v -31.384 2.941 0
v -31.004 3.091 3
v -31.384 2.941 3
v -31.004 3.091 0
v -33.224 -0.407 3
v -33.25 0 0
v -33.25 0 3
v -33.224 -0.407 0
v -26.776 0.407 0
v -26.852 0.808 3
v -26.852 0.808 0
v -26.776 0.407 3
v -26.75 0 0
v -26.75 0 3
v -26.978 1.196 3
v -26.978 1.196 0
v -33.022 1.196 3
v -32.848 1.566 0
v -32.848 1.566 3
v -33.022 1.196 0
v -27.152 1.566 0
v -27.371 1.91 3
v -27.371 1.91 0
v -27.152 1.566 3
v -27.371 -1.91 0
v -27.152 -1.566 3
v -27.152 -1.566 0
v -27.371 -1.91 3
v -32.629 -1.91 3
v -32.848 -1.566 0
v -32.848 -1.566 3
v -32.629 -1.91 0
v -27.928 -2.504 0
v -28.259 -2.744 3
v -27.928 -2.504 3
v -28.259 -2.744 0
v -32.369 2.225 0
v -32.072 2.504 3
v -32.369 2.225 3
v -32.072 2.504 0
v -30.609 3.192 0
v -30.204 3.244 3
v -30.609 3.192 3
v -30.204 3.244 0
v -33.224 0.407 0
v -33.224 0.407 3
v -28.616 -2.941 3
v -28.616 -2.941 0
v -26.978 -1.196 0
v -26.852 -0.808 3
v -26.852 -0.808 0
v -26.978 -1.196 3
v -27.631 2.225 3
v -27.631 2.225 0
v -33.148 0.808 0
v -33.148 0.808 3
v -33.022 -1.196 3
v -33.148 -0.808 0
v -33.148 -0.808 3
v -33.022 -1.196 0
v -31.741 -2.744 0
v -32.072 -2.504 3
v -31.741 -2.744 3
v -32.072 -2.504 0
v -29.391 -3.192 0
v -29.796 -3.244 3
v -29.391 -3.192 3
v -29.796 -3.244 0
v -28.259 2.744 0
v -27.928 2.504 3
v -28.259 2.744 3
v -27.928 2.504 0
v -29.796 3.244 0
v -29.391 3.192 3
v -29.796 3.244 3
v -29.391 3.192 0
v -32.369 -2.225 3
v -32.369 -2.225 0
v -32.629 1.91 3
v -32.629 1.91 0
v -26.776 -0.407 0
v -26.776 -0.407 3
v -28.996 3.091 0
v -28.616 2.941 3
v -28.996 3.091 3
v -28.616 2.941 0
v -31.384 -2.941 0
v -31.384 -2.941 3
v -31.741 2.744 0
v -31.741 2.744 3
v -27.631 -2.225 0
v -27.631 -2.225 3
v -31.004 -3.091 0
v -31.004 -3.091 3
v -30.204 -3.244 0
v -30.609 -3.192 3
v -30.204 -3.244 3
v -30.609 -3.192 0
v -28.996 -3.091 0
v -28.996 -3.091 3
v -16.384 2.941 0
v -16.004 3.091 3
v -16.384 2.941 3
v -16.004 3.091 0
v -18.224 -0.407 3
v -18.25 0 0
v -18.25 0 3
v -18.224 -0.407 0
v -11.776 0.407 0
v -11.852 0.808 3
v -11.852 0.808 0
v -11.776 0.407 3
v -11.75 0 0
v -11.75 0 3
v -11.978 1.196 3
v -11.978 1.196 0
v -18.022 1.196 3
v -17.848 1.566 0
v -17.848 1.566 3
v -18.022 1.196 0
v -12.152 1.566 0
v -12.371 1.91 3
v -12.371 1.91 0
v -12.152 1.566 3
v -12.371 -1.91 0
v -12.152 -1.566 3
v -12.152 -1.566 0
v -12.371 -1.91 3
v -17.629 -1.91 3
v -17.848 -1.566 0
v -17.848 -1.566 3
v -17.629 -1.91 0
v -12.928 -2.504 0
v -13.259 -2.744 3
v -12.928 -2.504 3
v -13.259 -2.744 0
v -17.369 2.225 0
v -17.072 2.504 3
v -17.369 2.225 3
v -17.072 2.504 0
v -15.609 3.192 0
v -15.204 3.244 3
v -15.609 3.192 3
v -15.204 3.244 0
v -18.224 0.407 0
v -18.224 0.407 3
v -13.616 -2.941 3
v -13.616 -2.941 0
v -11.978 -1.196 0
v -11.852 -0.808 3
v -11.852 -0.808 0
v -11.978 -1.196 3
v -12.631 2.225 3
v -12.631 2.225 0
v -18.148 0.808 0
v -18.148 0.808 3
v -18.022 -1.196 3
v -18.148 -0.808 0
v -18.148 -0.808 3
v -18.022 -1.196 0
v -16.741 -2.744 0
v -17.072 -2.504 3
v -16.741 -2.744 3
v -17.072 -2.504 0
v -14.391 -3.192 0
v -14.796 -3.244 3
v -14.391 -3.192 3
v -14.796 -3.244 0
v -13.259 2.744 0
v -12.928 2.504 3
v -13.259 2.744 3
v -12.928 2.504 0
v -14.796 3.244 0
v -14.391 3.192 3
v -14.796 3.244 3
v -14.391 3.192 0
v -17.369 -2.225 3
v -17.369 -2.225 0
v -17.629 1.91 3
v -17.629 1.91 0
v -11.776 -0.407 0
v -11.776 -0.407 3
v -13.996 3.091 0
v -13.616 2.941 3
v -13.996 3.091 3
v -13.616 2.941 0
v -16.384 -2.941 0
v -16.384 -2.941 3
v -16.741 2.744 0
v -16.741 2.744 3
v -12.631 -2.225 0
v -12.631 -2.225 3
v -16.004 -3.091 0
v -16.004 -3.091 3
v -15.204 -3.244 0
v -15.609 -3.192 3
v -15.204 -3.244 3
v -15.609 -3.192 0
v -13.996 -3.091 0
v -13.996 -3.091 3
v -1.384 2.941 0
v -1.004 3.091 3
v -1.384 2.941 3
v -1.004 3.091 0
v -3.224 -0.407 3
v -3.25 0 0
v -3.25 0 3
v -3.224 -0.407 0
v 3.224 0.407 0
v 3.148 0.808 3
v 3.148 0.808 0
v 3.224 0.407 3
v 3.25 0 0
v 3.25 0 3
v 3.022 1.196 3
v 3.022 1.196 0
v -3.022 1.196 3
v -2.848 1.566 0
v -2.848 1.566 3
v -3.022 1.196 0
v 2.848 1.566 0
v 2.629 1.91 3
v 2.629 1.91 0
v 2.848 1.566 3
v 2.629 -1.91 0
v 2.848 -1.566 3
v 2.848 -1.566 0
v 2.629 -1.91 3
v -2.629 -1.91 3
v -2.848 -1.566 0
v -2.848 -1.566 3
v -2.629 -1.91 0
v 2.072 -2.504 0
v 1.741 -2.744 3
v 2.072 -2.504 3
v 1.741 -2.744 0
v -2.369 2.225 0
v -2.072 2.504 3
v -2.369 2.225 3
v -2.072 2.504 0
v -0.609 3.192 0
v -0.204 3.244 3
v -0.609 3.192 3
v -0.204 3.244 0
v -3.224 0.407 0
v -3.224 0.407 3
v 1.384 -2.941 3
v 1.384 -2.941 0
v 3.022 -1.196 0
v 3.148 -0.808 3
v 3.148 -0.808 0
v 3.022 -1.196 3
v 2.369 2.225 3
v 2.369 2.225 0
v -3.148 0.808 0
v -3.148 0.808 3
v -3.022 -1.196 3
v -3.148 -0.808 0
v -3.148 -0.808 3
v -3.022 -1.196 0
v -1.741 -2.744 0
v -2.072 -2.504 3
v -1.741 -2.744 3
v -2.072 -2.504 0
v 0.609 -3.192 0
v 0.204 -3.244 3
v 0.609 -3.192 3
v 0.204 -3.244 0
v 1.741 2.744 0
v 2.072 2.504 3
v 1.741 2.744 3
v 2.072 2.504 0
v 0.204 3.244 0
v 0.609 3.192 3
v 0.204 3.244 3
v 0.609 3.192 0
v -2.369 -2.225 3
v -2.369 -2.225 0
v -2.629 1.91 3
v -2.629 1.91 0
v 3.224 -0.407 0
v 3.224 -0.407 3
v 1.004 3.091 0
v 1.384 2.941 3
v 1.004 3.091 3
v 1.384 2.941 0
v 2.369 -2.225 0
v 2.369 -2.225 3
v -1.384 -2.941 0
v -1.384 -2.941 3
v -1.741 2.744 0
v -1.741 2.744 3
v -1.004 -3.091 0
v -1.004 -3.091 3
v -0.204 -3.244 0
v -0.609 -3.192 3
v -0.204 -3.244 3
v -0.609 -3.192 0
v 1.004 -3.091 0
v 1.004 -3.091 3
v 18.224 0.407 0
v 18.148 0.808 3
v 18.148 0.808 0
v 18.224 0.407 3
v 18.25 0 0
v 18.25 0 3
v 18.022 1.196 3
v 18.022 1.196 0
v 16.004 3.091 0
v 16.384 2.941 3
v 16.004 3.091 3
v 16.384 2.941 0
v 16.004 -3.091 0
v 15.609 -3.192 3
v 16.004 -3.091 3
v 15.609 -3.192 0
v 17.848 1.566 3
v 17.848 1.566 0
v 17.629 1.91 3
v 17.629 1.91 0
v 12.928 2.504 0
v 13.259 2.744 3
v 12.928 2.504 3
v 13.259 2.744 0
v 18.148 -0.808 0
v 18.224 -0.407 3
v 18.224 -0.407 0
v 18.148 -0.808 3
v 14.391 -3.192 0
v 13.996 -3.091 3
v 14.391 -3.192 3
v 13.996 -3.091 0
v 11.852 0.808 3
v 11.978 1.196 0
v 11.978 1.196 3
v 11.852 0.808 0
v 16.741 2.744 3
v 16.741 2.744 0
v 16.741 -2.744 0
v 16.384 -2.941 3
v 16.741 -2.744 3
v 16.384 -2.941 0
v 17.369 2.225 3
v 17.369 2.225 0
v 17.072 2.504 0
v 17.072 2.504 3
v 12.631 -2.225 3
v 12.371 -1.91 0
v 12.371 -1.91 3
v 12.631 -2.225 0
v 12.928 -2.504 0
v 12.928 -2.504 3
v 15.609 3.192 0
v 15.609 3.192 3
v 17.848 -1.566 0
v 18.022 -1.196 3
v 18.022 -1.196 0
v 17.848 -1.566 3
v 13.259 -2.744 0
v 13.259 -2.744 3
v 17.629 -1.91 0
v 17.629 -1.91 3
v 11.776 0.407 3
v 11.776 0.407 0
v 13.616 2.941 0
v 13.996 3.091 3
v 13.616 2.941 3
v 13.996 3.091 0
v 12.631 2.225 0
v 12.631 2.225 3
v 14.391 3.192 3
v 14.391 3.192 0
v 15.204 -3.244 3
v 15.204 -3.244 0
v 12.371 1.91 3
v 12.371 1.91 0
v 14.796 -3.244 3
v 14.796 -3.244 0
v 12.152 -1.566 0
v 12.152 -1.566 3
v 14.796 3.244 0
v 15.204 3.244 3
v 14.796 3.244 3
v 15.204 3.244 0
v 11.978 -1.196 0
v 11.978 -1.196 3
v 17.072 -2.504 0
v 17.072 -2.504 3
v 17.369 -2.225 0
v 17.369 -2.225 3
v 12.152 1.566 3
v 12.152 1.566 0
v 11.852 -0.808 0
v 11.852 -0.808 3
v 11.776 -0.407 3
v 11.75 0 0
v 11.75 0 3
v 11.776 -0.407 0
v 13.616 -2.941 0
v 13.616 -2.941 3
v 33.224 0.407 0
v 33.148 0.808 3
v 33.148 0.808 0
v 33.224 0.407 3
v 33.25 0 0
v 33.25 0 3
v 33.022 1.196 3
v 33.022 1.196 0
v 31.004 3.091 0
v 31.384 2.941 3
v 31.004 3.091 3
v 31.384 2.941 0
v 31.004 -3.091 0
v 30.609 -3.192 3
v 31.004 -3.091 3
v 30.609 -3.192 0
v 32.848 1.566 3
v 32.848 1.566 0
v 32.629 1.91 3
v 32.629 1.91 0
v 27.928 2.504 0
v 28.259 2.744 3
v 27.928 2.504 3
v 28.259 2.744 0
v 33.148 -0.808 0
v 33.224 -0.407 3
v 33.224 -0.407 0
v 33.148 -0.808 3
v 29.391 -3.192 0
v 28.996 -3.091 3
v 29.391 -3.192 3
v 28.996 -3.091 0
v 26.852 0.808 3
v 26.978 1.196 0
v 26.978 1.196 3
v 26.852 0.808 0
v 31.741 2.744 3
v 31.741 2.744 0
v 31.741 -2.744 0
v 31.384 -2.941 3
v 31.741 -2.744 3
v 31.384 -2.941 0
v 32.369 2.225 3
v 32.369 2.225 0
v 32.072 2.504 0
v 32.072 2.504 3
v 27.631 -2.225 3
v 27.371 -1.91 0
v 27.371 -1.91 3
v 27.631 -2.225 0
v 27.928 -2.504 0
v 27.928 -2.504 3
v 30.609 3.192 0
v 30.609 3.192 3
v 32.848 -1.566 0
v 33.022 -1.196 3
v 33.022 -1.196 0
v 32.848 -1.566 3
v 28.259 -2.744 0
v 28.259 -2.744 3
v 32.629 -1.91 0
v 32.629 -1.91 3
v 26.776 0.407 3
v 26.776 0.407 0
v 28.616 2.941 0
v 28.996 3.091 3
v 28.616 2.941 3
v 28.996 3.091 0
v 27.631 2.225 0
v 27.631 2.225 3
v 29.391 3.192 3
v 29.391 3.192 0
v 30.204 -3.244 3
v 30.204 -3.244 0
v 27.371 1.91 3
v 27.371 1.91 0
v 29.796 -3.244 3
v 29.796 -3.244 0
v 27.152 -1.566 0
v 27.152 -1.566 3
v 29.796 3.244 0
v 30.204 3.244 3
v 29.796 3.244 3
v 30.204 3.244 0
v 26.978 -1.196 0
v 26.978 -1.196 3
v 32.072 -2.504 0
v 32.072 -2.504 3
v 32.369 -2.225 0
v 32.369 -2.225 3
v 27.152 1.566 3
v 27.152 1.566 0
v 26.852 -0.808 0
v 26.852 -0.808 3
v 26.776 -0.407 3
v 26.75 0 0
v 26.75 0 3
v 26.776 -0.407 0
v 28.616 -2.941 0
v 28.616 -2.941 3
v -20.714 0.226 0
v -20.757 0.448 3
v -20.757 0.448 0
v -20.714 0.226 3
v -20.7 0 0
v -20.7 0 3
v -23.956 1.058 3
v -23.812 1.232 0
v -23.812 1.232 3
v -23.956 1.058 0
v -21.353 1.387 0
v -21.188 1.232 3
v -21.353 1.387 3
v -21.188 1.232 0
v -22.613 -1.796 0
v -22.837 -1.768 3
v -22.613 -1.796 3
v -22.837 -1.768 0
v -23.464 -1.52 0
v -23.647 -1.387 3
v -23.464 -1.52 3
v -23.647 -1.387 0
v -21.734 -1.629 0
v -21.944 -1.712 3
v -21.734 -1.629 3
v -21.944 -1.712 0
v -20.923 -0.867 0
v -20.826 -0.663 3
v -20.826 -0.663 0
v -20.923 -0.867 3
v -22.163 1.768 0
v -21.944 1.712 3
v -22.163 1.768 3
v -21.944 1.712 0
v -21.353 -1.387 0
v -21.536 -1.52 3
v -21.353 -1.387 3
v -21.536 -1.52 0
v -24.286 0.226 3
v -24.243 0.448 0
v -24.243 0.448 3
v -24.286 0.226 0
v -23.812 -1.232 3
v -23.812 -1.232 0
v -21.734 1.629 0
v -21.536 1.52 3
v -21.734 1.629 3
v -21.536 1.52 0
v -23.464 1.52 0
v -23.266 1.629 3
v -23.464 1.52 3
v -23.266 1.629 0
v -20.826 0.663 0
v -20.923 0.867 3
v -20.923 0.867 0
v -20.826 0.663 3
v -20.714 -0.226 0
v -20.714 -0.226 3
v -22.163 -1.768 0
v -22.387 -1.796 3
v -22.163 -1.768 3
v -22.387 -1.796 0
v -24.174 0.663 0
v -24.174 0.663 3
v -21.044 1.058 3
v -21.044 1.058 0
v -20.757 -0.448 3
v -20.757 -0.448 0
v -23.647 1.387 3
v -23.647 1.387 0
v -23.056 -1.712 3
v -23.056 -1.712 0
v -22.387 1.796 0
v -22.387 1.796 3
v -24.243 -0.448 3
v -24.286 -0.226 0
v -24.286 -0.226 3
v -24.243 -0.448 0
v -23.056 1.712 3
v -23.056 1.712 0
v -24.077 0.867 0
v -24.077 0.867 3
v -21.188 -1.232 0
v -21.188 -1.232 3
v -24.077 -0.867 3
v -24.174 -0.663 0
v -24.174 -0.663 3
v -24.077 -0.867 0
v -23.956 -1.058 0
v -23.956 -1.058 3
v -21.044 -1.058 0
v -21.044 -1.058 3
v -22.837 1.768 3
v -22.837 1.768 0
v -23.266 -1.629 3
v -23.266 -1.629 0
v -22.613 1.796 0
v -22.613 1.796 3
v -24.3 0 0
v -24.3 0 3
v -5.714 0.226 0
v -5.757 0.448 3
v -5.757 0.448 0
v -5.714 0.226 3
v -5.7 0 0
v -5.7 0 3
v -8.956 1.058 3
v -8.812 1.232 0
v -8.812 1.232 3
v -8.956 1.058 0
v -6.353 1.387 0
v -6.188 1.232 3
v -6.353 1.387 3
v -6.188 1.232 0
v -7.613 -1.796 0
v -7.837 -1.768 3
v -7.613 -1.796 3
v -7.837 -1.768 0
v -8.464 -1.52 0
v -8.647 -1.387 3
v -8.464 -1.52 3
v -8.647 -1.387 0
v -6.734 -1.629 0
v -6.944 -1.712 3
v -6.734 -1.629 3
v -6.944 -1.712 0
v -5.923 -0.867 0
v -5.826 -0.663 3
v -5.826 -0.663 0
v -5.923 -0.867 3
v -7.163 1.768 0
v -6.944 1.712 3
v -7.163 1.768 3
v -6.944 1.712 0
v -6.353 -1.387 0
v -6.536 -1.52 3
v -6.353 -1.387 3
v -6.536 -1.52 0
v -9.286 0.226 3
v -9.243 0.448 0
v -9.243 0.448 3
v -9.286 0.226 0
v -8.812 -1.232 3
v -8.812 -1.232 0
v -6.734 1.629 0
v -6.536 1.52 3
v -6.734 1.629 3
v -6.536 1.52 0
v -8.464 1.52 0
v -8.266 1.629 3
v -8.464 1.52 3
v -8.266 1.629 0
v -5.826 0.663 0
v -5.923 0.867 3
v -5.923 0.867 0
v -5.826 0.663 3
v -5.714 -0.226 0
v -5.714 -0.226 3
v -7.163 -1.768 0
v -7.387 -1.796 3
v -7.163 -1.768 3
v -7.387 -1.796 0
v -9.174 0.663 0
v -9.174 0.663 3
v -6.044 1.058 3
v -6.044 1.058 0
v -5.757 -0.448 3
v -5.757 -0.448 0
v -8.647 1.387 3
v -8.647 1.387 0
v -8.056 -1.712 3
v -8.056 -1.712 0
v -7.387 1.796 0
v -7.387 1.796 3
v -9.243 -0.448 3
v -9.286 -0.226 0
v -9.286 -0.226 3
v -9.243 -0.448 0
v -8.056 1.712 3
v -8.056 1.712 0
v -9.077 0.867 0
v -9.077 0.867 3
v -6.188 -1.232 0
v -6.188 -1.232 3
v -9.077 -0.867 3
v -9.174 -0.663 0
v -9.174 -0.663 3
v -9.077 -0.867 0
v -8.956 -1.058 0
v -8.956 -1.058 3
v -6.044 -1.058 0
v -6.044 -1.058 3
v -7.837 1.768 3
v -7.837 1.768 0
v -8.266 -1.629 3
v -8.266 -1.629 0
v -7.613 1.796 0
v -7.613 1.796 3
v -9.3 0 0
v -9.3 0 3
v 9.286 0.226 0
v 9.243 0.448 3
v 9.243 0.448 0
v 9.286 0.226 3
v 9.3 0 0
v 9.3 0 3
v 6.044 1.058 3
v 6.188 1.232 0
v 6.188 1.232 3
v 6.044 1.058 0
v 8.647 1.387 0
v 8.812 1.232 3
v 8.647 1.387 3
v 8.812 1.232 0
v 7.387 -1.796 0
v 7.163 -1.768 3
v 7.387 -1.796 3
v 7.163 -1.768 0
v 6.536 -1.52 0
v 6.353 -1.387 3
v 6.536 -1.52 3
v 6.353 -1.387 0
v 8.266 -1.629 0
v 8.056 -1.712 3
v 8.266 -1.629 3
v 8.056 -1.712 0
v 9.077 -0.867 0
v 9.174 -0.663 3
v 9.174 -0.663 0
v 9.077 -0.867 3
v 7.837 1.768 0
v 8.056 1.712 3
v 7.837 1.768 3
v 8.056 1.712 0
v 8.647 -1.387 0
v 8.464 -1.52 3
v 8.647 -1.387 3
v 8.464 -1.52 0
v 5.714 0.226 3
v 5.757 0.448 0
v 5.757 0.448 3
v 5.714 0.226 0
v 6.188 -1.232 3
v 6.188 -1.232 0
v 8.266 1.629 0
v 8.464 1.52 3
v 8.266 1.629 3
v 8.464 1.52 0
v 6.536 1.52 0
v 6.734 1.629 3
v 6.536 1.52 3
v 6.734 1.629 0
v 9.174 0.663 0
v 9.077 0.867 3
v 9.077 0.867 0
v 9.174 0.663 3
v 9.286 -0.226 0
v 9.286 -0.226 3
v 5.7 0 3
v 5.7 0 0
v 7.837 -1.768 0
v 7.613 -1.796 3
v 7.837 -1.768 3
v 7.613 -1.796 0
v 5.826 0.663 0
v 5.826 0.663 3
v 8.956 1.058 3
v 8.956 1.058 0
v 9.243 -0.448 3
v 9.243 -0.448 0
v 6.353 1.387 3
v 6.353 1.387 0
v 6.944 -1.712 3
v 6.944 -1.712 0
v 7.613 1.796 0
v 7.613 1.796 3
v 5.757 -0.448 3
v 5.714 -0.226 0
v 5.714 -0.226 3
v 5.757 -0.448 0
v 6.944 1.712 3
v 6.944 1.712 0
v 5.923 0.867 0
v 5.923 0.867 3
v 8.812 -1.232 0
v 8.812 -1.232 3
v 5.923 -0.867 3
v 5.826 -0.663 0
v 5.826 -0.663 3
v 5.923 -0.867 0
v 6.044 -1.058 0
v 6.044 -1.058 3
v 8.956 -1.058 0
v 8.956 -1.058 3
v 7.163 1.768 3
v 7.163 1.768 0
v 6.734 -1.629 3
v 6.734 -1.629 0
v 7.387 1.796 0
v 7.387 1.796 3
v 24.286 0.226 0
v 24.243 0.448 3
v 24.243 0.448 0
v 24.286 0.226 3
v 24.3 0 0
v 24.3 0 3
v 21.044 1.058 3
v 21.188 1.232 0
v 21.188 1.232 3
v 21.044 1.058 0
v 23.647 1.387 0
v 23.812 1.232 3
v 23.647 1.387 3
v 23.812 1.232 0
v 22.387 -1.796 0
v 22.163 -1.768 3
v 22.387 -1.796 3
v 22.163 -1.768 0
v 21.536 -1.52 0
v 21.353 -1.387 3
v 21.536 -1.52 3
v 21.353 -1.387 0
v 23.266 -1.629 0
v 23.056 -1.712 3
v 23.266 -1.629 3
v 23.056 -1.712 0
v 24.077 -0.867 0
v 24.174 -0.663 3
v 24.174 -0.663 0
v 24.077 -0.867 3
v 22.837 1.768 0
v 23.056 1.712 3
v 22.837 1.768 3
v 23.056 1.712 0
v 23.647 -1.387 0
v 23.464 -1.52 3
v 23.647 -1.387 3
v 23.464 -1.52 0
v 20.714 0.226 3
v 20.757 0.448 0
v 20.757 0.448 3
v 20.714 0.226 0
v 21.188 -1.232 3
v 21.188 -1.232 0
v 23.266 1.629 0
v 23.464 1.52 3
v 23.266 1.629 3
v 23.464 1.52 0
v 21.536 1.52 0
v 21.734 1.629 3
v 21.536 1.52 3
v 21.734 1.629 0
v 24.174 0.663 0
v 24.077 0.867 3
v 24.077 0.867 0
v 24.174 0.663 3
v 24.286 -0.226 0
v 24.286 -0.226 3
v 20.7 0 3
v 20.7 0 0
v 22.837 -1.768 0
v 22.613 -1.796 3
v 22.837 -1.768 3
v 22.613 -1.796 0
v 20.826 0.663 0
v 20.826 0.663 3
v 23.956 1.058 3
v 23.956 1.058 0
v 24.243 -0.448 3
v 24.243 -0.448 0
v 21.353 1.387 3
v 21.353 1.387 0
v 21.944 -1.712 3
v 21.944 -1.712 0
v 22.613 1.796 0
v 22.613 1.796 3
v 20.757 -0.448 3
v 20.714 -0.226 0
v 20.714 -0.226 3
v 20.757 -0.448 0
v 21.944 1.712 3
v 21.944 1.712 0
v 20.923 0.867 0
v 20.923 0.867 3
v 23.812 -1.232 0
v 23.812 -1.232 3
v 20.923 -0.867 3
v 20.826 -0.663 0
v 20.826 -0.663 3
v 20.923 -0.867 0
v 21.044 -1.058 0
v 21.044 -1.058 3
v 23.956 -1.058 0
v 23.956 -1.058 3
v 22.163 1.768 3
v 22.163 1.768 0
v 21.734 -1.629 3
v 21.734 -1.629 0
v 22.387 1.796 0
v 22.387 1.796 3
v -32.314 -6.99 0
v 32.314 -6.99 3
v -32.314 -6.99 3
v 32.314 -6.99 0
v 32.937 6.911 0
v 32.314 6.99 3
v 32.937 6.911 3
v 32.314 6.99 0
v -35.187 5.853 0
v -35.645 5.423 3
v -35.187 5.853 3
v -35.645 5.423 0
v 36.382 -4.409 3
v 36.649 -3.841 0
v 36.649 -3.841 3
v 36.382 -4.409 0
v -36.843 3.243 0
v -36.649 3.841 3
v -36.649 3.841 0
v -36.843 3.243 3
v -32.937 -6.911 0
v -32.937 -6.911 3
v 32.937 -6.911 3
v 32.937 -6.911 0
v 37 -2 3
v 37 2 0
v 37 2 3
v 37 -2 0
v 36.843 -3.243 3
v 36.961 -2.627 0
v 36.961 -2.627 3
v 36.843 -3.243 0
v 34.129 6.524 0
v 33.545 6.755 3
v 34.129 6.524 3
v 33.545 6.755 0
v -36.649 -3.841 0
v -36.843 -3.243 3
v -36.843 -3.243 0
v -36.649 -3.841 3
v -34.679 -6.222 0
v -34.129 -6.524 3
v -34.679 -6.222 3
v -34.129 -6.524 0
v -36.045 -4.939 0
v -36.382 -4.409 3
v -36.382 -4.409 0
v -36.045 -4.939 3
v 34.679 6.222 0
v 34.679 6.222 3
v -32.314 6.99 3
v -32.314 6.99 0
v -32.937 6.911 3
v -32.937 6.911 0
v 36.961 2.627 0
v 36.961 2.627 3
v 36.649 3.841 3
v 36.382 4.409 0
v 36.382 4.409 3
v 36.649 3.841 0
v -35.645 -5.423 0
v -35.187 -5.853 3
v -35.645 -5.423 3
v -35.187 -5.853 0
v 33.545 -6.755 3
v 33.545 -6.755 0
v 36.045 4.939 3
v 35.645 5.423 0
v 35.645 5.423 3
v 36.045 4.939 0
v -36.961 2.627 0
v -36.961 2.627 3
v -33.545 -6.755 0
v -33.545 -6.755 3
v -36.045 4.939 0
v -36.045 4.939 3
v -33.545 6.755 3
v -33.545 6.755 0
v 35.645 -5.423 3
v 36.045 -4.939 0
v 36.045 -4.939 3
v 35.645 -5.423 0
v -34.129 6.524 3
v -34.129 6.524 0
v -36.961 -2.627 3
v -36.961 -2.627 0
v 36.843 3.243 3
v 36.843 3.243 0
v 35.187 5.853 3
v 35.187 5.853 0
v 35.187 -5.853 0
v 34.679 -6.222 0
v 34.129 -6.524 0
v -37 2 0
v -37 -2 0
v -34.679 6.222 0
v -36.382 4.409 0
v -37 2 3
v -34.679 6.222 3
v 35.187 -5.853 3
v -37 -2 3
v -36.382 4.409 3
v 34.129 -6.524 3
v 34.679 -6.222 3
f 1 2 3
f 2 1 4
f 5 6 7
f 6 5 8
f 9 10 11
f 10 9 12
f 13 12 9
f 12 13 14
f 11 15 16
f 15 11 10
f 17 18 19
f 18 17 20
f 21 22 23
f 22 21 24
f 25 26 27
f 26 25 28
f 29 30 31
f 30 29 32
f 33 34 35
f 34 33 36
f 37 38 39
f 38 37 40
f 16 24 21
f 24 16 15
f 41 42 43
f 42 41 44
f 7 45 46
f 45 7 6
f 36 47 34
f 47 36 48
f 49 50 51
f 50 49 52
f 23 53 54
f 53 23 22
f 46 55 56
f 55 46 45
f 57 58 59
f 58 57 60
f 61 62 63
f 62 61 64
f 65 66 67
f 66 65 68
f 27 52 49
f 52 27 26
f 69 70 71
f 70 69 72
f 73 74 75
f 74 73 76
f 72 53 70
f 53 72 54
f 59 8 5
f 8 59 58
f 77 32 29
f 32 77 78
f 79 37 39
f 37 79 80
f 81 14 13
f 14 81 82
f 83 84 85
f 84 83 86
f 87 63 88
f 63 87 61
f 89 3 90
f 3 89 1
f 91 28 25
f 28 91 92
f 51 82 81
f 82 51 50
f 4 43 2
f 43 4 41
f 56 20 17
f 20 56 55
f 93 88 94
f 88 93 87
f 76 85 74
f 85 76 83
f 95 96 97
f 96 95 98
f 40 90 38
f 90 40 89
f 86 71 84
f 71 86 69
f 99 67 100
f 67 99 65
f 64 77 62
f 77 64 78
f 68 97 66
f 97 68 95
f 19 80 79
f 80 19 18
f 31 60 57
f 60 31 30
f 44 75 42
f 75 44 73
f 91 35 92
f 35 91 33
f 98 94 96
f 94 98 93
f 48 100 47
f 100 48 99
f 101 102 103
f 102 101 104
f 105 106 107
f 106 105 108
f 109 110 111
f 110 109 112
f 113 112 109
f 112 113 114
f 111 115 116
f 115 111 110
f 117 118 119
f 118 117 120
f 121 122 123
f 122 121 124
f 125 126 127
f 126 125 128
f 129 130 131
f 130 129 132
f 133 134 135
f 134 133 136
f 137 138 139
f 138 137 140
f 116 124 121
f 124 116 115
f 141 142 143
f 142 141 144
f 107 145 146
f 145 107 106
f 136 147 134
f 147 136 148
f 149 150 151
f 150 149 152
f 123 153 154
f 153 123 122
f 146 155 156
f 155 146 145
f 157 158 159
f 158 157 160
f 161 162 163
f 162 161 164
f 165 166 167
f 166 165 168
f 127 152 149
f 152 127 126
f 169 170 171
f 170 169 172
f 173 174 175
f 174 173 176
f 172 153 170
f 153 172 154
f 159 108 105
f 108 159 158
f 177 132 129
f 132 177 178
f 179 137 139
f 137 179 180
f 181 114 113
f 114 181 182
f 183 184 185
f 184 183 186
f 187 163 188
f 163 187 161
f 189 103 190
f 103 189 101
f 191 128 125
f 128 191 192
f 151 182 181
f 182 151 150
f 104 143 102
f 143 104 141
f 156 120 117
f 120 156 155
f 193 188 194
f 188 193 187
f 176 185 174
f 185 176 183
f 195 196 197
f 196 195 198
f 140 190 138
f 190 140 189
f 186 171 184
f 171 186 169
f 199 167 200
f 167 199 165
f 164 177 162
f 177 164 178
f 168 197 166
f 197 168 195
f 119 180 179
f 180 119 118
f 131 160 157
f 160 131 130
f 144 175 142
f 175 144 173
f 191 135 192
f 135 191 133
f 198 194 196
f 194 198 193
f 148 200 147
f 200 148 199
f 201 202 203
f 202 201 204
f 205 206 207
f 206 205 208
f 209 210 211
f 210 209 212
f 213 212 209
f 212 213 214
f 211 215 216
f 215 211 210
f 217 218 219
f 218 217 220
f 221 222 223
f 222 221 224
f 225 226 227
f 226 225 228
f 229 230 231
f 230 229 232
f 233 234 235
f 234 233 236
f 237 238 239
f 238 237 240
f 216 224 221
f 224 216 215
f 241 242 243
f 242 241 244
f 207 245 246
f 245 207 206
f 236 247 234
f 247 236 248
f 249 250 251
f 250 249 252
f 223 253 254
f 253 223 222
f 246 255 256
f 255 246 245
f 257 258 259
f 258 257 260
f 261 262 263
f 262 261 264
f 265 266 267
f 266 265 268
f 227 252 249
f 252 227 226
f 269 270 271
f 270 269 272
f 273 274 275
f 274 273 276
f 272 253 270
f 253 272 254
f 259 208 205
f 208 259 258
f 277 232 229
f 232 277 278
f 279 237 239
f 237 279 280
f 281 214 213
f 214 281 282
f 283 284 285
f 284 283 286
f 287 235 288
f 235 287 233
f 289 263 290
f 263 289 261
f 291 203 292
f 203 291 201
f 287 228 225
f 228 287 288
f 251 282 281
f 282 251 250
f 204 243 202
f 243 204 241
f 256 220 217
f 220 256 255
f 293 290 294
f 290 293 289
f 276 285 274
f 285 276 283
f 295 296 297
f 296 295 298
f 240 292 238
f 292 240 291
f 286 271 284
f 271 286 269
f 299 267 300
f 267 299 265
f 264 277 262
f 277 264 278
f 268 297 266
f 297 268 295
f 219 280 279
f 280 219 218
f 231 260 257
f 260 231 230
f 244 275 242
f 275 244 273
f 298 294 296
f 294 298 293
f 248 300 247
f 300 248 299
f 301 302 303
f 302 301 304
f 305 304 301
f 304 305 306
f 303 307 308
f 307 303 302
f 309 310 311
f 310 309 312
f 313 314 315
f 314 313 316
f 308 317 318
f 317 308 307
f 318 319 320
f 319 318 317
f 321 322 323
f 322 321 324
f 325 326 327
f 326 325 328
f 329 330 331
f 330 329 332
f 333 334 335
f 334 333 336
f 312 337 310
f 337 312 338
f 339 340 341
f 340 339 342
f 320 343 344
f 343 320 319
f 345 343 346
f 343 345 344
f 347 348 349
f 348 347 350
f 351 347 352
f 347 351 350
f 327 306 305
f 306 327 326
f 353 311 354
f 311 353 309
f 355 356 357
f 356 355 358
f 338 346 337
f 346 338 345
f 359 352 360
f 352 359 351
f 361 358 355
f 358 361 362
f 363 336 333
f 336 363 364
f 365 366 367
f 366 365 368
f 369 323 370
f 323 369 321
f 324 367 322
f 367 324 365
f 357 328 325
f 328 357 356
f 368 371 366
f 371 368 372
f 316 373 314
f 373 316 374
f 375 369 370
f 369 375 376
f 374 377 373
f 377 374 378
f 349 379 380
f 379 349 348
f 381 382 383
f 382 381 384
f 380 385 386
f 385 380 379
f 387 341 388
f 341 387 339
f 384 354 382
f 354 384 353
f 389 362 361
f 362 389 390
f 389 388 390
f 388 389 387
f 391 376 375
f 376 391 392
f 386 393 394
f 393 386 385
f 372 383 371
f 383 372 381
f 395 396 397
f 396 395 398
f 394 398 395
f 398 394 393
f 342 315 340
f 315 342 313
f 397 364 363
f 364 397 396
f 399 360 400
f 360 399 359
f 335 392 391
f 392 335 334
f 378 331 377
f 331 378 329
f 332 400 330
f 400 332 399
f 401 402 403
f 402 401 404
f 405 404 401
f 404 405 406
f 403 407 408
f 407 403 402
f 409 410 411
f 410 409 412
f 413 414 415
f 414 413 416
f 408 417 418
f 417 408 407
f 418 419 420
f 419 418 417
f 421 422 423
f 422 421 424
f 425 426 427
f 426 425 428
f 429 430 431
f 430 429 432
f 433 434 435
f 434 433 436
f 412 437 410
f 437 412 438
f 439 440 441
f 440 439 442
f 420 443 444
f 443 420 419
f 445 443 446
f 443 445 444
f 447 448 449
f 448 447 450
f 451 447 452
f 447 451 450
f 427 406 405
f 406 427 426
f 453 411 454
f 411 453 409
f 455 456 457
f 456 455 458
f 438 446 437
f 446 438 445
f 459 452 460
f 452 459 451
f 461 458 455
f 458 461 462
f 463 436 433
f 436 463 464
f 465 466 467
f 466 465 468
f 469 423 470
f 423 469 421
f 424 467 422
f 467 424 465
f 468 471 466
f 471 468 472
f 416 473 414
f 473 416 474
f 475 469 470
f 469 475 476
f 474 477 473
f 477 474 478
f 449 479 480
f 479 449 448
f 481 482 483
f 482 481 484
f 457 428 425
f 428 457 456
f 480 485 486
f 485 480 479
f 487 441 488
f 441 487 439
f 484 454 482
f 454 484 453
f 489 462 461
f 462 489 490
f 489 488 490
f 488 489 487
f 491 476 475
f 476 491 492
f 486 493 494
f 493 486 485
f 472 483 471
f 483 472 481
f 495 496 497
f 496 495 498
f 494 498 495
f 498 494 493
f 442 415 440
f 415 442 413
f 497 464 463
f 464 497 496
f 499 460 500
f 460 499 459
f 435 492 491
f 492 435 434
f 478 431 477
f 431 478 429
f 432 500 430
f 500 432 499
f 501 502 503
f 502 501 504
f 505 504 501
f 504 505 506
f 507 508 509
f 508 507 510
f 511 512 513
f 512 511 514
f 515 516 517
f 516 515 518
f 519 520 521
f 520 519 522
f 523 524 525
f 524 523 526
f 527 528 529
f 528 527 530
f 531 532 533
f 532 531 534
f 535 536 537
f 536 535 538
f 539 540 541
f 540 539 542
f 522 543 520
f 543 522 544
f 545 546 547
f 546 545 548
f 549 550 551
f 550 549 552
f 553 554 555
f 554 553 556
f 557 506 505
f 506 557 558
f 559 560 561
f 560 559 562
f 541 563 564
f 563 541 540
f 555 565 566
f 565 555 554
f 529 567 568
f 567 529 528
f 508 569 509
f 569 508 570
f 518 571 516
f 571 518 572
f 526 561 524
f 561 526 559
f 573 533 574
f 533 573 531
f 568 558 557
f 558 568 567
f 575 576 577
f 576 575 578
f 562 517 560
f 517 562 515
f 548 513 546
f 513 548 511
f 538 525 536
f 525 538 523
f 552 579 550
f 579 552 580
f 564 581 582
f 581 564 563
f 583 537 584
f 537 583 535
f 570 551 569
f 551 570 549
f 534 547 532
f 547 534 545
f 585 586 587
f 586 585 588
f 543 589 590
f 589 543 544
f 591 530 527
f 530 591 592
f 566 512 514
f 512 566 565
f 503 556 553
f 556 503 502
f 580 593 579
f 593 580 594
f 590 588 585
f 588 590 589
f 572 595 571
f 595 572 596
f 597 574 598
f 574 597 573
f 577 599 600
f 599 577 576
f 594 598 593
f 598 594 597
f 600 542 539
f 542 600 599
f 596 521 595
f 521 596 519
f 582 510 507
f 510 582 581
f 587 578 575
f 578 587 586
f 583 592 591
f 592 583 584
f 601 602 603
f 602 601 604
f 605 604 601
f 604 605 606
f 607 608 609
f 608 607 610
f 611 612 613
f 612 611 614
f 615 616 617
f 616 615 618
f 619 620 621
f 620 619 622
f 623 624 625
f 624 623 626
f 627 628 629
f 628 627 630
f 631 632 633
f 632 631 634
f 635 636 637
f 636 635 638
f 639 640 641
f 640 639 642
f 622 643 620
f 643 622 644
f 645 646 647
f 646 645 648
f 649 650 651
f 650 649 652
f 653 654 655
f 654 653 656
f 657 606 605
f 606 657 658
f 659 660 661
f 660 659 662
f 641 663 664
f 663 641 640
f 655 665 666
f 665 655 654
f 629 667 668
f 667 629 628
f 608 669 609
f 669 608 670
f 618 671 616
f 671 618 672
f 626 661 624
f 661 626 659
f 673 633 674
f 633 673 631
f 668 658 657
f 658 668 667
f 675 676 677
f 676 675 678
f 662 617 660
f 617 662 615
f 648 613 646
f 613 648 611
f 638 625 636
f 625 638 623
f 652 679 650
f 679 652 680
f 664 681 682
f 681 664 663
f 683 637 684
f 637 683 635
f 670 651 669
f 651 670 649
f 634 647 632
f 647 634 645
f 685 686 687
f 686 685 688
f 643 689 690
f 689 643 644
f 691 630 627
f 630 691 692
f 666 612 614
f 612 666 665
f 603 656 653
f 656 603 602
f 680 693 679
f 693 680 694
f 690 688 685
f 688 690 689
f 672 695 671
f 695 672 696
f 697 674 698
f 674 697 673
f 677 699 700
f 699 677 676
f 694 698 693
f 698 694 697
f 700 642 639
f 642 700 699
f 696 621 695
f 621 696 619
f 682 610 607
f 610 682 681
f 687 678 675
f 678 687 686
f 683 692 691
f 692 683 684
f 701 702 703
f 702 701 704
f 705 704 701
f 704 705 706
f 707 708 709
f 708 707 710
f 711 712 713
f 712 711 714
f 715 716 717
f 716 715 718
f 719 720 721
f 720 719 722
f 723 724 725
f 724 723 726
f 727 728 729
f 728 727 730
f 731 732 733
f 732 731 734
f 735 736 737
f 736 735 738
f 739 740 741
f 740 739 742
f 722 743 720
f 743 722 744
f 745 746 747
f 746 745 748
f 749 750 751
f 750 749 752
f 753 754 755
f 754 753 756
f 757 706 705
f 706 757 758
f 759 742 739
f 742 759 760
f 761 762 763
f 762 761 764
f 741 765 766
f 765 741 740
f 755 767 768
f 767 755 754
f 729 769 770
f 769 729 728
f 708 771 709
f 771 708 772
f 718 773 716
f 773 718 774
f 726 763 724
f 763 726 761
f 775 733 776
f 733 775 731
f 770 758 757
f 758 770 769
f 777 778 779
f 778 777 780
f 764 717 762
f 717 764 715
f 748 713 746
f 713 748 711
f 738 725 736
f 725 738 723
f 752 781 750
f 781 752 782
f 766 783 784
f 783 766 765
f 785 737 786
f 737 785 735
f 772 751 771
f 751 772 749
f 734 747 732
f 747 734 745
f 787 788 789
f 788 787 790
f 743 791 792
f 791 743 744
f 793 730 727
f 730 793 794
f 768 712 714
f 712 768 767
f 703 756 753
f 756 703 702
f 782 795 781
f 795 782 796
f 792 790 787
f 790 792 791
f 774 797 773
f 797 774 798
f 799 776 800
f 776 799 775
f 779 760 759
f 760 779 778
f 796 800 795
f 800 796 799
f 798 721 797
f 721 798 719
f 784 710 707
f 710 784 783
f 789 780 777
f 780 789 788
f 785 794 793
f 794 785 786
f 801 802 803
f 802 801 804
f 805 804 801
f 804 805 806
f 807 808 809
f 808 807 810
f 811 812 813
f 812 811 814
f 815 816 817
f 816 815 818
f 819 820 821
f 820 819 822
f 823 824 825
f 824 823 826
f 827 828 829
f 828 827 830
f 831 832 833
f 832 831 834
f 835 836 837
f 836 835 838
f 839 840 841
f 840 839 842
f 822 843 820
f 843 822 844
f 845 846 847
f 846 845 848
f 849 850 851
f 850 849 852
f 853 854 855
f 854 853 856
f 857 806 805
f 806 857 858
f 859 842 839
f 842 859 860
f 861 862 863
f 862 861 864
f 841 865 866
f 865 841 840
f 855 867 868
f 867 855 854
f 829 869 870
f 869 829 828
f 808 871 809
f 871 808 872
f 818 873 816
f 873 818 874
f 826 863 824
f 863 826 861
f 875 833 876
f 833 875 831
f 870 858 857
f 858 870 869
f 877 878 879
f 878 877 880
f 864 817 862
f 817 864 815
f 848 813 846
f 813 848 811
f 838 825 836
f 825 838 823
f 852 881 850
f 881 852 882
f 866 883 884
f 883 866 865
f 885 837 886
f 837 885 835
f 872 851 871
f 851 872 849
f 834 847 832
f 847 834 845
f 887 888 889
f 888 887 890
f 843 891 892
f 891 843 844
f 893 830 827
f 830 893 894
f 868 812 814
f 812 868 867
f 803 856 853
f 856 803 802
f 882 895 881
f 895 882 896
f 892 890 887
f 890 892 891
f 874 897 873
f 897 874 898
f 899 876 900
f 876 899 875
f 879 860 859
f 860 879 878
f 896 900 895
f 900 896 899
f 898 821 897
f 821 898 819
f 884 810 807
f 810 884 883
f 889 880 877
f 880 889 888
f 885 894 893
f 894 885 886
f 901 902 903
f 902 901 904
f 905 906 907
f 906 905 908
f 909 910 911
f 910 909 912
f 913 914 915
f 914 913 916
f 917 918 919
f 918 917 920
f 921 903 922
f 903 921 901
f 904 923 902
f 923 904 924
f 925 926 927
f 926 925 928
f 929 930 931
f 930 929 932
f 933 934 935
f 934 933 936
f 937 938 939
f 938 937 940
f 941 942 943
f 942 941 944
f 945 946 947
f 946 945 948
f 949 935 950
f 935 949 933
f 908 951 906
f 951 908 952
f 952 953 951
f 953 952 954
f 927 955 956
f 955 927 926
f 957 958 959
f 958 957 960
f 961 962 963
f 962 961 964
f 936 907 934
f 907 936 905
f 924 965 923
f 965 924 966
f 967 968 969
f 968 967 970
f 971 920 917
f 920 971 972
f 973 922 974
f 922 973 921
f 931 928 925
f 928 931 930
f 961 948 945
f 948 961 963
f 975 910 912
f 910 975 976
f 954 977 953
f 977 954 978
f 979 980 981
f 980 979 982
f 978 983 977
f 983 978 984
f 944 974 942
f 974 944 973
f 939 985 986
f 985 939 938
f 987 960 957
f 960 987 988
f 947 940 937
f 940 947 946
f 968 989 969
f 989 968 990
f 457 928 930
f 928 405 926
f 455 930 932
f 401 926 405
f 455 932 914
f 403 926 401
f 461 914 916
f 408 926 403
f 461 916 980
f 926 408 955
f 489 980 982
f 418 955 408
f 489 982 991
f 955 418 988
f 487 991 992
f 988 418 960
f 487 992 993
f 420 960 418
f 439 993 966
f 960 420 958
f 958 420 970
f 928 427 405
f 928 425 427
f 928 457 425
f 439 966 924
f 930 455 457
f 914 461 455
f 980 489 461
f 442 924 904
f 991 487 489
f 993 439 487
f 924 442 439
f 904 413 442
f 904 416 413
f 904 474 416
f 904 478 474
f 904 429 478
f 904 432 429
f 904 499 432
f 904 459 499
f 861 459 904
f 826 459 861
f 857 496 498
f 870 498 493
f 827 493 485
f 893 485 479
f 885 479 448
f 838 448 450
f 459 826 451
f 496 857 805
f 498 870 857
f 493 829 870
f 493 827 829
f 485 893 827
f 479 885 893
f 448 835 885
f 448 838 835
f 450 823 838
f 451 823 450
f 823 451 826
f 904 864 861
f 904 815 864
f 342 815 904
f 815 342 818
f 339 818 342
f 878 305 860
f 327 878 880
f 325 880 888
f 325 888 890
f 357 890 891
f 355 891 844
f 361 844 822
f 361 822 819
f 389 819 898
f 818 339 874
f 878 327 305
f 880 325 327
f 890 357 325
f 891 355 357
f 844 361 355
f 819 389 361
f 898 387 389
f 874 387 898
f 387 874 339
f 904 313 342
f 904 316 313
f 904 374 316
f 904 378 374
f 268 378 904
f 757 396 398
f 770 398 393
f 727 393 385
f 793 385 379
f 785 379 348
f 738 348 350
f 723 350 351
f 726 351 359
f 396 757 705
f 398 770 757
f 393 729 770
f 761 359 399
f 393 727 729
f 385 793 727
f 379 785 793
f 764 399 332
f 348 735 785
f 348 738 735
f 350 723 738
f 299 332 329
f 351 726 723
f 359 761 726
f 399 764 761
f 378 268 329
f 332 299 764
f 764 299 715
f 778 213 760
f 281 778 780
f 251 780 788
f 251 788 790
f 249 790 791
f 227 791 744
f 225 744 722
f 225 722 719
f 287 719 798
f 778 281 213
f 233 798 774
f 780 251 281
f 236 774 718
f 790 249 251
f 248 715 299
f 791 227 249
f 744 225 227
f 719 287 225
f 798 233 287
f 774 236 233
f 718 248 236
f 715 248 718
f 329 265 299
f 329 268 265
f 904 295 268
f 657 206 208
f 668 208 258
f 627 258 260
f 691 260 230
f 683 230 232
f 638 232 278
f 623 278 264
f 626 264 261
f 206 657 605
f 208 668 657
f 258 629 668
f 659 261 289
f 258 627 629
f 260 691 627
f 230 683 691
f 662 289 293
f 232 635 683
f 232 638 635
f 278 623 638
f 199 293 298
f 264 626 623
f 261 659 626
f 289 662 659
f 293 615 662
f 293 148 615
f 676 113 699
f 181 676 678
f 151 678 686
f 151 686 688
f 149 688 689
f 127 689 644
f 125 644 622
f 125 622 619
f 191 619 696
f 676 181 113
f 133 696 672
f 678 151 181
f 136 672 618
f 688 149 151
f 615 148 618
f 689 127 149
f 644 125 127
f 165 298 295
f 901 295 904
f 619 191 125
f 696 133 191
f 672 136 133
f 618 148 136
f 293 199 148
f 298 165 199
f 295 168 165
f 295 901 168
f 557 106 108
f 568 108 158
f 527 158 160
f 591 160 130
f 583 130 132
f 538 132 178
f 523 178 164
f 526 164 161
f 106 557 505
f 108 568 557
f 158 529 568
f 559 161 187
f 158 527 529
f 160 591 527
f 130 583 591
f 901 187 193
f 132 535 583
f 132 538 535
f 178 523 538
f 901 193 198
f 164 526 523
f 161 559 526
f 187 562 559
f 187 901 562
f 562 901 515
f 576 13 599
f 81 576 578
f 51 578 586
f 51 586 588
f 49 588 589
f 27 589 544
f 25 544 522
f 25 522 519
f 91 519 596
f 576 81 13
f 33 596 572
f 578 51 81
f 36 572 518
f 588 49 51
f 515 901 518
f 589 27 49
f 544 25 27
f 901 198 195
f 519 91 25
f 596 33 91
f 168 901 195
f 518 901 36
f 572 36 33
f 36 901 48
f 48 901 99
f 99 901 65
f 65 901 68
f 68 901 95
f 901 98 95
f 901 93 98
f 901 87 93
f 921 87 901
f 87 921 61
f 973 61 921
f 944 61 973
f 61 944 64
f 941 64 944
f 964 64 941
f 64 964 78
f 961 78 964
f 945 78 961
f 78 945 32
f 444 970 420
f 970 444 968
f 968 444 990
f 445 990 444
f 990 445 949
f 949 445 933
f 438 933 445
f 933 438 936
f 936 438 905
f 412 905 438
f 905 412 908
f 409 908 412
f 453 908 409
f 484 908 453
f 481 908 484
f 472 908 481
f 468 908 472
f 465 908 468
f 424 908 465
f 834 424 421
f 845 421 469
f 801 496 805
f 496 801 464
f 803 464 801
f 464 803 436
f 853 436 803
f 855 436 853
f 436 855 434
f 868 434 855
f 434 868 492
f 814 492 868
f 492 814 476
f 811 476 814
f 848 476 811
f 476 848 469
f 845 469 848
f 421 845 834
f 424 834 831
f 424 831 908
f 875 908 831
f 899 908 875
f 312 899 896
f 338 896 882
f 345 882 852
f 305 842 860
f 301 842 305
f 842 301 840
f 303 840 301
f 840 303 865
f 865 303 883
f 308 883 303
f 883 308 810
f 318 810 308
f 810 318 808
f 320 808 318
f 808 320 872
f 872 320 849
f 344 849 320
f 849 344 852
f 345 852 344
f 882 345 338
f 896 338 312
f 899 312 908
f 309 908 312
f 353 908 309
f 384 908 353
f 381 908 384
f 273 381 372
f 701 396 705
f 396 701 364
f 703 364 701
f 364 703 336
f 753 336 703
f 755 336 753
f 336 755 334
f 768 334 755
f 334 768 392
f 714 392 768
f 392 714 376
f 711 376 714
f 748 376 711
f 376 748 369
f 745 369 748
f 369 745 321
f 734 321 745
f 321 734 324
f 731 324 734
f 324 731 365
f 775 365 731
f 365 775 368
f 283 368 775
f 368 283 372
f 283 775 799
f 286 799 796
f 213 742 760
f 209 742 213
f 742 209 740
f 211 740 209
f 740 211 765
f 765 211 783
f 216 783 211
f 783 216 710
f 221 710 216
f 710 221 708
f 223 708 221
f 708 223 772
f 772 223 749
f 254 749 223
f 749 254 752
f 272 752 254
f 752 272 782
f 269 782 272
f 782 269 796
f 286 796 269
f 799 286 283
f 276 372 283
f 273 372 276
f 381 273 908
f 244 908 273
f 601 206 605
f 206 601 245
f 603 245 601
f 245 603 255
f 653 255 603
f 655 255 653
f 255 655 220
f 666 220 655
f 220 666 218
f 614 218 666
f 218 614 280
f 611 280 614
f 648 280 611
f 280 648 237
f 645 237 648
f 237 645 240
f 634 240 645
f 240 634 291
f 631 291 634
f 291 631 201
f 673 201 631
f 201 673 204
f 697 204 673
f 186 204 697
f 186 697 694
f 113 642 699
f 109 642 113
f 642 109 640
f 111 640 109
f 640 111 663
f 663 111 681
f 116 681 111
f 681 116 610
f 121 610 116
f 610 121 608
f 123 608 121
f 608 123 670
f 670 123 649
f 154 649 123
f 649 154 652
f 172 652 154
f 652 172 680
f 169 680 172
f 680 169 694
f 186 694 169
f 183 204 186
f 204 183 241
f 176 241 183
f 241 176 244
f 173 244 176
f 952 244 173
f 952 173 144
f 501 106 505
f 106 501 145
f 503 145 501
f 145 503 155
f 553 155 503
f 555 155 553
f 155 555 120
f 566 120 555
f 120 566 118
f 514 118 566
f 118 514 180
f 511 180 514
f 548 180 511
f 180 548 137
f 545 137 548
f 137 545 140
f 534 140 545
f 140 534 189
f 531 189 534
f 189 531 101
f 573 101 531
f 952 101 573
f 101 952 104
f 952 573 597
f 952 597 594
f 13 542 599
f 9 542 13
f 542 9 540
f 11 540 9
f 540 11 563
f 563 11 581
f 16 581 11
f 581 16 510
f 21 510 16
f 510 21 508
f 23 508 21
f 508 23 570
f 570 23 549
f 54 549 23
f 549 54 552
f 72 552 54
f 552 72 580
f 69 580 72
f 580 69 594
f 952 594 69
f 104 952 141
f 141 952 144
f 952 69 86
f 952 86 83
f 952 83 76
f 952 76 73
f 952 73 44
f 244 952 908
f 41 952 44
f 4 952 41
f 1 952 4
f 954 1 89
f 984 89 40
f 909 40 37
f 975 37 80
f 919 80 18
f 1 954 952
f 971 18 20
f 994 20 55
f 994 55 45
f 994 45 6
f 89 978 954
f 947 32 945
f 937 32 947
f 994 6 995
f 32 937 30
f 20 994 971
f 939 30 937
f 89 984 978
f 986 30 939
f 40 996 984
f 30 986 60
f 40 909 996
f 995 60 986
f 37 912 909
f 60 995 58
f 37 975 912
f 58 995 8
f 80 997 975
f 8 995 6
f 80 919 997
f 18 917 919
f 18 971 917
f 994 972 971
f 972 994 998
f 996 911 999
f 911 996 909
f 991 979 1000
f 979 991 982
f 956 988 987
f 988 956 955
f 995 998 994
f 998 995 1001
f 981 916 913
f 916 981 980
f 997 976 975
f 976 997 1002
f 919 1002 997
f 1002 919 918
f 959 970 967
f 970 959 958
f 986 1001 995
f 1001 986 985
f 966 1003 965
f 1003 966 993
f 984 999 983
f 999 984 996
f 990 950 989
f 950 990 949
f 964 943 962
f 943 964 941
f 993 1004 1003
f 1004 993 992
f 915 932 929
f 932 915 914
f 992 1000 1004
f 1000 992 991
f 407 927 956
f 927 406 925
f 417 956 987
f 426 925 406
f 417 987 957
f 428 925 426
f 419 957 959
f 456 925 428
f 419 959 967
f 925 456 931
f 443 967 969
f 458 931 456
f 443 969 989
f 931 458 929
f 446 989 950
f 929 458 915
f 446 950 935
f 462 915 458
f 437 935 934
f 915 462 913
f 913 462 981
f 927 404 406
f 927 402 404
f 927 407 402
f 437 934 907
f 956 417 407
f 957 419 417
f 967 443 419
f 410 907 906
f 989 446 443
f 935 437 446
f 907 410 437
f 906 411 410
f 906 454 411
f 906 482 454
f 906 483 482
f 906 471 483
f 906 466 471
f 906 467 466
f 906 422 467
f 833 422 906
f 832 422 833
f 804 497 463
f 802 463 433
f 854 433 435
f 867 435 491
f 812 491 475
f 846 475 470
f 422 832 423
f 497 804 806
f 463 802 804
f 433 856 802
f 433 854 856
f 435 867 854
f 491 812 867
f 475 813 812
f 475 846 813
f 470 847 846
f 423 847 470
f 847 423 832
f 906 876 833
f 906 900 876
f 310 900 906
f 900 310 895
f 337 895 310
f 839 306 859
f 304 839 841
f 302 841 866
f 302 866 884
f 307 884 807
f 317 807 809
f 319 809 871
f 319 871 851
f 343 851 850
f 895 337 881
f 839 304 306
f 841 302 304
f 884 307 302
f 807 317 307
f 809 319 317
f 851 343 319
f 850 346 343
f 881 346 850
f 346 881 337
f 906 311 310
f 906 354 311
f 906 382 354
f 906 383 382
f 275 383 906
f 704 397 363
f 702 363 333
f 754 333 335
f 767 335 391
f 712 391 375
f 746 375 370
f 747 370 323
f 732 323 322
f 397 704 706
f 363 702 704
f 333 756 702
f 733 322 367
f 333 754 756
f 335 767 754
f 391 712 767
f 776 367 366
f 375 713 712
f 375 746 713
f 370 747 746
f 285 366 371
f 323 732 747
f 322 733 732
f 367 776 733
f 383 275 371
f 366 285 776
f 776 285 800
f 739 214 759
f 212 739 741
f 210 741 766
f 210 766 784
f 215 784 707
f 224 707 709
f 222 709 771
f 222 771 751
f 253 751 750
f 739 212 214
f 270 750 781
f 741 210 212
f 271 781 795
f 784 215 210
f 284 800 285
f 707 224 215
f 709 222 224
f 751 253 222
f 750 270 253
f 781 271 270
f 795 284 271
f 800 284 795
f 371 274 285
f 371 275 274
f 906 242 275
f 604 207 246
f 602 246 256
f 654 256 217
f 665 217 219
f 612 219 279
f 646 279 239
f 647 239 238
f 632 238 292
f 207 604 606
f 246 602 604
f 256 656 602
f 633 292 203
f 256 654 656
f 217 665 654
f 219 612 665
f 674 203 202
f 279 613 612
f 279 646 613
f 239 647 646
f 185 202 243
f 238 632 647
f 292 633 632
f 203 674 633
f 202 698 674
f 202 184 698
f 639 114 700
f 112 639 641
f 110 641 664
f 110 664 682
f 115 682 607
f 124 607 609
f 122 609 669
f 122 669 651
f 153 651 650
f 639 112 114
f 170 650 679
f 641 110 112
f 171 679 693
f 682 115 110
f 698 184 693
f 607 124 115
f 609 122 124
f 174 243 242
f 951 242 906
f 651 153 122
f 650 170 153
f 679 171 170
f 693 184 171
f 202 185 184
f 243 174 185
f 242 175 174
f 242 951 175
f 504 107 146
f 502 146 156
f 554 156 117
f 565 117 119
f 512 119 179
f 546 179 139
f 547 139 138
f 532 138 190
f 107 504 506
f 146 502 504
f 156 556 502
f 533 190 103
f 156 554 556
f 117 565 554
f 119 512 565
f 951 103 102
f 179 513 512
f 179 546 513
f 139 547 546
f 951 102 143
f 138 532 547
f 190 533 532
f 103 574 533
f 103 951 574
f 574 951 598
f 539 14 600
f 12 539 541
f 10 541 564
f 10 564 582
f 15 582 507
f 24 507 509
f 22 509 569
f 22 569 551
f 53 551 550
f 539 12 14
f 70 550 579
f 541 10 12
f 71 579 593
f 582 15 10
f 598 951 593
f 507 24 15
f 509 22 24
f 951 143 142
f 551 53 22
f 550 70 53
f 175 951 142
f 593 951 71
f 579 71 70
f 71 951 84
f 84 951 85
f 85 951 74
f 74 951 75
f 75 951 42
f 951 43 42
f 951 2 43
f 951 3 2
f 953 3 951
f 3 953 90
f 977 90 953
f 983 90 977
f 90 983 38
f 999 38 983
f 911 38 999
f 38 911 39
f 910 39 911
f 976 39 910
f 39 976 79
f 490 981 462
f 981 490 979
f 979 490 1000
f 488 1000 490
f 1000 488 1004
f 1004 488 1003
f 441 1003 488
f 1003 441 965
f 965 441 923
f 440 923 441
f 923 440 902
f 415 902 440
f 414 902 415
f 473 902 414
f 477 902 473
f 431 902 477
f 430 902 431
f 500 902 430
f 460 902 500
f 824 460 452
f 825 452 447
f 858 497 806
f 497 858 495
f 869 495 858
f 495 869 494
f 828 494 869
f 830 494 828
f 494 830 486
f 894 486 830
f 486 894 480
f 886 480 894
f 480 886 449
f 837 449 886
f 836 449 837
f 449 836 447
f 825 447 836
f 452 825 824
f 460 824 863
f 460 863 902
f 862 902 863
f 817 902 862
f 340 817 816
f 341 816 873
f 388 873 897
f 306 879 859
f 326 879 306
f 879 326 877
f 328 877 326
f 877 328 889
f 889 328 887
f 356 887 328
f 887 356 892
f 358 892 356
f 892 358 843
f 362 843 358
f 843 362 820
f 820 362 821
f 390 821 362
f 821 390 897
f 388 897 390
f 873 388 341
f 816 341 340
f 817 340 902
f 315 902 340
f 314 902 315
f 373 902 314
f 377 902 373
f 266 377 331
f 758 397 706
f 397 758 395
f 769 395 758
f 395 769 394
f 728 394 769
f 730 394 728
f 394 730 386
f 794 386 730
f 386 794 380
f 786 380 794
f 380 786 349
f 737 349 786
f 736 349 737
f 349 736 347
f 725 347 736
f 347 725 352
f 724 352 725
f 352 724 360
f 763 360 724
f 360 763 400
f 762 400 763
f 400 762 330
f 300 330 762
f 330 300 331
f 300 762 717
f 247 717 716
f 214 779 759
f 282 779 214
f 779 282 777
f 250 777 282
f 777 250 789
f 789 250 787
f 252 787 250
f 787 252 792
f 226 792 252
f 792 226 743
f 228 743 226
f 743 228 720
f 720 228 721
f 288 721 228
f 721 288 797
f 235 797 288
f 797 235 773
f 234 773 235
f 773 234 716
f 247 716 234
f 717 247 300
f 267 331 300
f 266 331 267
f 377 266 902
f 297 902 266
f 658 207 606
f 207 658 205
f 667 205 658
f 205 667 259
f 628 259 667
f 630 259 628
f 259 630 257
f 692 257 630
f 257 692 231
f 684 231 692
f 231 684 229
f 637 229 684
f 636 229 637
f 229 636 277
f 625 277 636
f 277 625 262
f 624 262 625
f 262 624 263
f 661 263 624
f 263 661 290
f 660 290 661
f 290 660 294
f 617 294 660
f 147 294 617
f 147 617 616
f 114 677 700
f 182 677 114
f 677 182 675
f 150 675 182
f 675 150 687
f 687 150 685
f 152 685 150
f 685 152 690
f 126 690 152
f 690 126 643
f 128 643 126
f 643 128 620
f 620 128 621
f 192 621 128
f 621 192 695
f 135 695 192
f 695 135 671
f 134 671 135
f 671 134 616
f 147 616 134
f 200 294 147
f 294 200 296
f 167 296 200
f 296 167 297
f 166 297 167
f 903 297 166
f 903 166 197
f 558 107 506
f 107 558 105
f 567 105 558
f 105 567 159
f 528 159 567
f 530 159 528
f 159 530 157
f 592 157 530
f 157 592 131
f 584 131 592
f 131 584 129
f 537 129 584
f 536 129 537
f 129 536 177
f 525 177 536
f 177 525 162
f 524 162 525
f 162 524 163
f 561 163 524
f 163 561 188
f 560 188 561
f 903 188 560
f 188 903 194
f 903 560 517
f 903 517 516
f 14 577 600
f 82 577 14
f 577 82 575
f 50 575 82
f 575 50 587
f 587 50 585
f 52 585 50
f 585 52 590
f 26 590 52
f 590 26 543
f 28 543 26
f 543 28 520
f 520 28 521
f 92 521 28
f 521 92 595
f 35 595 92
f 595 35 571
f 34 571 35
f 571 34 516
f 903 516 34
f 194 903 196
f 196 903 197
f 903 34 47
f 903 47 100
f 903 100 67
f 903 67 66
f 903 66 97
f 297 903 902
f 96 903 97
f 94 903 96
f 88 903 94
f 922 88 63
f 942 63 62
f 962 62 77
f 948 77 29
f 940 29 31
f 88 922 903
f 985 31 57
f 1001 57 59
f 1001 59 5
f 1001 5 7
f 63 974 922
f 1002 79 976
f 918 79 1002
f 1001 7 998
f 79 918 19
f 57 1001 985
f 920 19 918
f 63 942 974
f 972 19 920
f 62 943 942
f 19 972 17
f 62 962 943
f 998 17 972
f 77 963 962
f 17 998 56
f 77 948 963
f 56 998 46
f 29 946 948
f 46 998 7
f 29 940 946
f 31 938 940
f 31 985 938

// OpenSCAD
$fn = 50;


difference() {
	union() {
		*color(alpha = 1.0000000000, c = "gray") {
			translate(v = [0, 7, 0]) {
				linear_extrude(height = 1) {
					text(font = "Arial:style=Bold", halign = "center", size = 4.5000000000, text = "COMMENT plate main", valign = "center");
				}
			}
		}
		hull() {
			translate(v = [-32.0000000000, 2.0000000000, 0]) {
				cylinder(h = 3, r = 5);
			}
			translate(v = [32.0000000000, 2.0000000000, 0]) {
				cylinder(h = 3, r = 5);
			}
			translate(v = [-32.0000000000, -2.0000000000, 0]) {
				cylinder(h = 3, r = 5);
			}
			translate(v = [32.0000000000, -2.0000000000, 0]) {
				cylinder(h = 3, r = 5);
			}
		}
	}
	union() {
		*color(alpha = 1.0000000000, c = "gray") {
			translate(v = [0, 7, 0]) {
				linear_extrude(height = 1) {
					text(font = "Arial:style=Bold", halign = "center", size = 4.5000000000, text = "COMMENT holes main", valign = "center");
				}
			}
		}
		translate(v = [-30.0000000000, 0.0000000000, 0]) {
			translate(v = [0, 0, -100]) {
				cylinder(h = 200, r = 3.2500000000);
			}
		}
		translate(v = [-15.0000000000, 0.0000000000, 0]) {
			translate(v = [0, 0, -100]) {
				cylinder(h = 200, r = 3.2500000000);
			}
		}
		translate(v = [0, 0, -100]) {
			cylinder(h = 200, r = 3.2500000000);
		}
		translate(v = [15.0000000000, 0.0000000000, 0]) {
			translate(v = [0, 0, -100]) {
				cylinder(h = 200, r = 3.2500000000);
			}
		}
		translate(v = [30.0000000000, 0.0000000000, 0]) {
			translate(v = [0, 0, -100]) {
				cylinder(h = 200, r = 3.2500000000);
			}
		}
		translate(v = [-30.0000000000, 0.0000000000, 0]) {
			translate(v = [0, 0, -100]) {
				cylinder(h = 200, r = 1.8000000000);
			}
		}
		translate(v = [-22.5000000000, 0.0000000000, 0]) {
			translate(v = [0, 0, -100]) {
				cylinder(h = 200, r = 1.8000000000);
			}
		}
		translate(v = [-15.0000000000, 0.0000000000, 0]) {
			translate(v = [0, 0, -100]) {
				cylinder(h = 200, r = 1.8000000000);
			}
		}
		translate(v = [-7.5000000000, 0.0000000000, 0]) {
			translate(v = [0, 0, -100]) {
				cylinder(h = 200, r = 1.8000000000);
			}
		}
		translate(v = [0, 0, -100]) {
			cylinder(h = 200, r = 1.8000000000);
		}
		translate(v = [7.5000000000, 0.0000000000, 0]) {
			translate(v = [0, 0, -100]) {
				cylinder(h = 200, r = 1.8000000000);
			}
		}
		translate(v = [15.0000000000, 0.0000000000, 0]) {
			translate(v = [0, 0, -100]) {
				cylinder(h = 200, r = 1.8000000000);
			}
		}
		translate(v = [22.5000000000, 0.0000000000, 0]) {
			translate(v = [0, 0, -100]) {
				cylinder(h = 200, r = 1.8000000000);
			}
		}
		translate(v = [30.0000000000, 0.0000000000, 0]) {
			translate(v = [0, 0, -100]) {
				cylinder(h = 200, r = 1.8000000000);
			}
		}
	}
}
